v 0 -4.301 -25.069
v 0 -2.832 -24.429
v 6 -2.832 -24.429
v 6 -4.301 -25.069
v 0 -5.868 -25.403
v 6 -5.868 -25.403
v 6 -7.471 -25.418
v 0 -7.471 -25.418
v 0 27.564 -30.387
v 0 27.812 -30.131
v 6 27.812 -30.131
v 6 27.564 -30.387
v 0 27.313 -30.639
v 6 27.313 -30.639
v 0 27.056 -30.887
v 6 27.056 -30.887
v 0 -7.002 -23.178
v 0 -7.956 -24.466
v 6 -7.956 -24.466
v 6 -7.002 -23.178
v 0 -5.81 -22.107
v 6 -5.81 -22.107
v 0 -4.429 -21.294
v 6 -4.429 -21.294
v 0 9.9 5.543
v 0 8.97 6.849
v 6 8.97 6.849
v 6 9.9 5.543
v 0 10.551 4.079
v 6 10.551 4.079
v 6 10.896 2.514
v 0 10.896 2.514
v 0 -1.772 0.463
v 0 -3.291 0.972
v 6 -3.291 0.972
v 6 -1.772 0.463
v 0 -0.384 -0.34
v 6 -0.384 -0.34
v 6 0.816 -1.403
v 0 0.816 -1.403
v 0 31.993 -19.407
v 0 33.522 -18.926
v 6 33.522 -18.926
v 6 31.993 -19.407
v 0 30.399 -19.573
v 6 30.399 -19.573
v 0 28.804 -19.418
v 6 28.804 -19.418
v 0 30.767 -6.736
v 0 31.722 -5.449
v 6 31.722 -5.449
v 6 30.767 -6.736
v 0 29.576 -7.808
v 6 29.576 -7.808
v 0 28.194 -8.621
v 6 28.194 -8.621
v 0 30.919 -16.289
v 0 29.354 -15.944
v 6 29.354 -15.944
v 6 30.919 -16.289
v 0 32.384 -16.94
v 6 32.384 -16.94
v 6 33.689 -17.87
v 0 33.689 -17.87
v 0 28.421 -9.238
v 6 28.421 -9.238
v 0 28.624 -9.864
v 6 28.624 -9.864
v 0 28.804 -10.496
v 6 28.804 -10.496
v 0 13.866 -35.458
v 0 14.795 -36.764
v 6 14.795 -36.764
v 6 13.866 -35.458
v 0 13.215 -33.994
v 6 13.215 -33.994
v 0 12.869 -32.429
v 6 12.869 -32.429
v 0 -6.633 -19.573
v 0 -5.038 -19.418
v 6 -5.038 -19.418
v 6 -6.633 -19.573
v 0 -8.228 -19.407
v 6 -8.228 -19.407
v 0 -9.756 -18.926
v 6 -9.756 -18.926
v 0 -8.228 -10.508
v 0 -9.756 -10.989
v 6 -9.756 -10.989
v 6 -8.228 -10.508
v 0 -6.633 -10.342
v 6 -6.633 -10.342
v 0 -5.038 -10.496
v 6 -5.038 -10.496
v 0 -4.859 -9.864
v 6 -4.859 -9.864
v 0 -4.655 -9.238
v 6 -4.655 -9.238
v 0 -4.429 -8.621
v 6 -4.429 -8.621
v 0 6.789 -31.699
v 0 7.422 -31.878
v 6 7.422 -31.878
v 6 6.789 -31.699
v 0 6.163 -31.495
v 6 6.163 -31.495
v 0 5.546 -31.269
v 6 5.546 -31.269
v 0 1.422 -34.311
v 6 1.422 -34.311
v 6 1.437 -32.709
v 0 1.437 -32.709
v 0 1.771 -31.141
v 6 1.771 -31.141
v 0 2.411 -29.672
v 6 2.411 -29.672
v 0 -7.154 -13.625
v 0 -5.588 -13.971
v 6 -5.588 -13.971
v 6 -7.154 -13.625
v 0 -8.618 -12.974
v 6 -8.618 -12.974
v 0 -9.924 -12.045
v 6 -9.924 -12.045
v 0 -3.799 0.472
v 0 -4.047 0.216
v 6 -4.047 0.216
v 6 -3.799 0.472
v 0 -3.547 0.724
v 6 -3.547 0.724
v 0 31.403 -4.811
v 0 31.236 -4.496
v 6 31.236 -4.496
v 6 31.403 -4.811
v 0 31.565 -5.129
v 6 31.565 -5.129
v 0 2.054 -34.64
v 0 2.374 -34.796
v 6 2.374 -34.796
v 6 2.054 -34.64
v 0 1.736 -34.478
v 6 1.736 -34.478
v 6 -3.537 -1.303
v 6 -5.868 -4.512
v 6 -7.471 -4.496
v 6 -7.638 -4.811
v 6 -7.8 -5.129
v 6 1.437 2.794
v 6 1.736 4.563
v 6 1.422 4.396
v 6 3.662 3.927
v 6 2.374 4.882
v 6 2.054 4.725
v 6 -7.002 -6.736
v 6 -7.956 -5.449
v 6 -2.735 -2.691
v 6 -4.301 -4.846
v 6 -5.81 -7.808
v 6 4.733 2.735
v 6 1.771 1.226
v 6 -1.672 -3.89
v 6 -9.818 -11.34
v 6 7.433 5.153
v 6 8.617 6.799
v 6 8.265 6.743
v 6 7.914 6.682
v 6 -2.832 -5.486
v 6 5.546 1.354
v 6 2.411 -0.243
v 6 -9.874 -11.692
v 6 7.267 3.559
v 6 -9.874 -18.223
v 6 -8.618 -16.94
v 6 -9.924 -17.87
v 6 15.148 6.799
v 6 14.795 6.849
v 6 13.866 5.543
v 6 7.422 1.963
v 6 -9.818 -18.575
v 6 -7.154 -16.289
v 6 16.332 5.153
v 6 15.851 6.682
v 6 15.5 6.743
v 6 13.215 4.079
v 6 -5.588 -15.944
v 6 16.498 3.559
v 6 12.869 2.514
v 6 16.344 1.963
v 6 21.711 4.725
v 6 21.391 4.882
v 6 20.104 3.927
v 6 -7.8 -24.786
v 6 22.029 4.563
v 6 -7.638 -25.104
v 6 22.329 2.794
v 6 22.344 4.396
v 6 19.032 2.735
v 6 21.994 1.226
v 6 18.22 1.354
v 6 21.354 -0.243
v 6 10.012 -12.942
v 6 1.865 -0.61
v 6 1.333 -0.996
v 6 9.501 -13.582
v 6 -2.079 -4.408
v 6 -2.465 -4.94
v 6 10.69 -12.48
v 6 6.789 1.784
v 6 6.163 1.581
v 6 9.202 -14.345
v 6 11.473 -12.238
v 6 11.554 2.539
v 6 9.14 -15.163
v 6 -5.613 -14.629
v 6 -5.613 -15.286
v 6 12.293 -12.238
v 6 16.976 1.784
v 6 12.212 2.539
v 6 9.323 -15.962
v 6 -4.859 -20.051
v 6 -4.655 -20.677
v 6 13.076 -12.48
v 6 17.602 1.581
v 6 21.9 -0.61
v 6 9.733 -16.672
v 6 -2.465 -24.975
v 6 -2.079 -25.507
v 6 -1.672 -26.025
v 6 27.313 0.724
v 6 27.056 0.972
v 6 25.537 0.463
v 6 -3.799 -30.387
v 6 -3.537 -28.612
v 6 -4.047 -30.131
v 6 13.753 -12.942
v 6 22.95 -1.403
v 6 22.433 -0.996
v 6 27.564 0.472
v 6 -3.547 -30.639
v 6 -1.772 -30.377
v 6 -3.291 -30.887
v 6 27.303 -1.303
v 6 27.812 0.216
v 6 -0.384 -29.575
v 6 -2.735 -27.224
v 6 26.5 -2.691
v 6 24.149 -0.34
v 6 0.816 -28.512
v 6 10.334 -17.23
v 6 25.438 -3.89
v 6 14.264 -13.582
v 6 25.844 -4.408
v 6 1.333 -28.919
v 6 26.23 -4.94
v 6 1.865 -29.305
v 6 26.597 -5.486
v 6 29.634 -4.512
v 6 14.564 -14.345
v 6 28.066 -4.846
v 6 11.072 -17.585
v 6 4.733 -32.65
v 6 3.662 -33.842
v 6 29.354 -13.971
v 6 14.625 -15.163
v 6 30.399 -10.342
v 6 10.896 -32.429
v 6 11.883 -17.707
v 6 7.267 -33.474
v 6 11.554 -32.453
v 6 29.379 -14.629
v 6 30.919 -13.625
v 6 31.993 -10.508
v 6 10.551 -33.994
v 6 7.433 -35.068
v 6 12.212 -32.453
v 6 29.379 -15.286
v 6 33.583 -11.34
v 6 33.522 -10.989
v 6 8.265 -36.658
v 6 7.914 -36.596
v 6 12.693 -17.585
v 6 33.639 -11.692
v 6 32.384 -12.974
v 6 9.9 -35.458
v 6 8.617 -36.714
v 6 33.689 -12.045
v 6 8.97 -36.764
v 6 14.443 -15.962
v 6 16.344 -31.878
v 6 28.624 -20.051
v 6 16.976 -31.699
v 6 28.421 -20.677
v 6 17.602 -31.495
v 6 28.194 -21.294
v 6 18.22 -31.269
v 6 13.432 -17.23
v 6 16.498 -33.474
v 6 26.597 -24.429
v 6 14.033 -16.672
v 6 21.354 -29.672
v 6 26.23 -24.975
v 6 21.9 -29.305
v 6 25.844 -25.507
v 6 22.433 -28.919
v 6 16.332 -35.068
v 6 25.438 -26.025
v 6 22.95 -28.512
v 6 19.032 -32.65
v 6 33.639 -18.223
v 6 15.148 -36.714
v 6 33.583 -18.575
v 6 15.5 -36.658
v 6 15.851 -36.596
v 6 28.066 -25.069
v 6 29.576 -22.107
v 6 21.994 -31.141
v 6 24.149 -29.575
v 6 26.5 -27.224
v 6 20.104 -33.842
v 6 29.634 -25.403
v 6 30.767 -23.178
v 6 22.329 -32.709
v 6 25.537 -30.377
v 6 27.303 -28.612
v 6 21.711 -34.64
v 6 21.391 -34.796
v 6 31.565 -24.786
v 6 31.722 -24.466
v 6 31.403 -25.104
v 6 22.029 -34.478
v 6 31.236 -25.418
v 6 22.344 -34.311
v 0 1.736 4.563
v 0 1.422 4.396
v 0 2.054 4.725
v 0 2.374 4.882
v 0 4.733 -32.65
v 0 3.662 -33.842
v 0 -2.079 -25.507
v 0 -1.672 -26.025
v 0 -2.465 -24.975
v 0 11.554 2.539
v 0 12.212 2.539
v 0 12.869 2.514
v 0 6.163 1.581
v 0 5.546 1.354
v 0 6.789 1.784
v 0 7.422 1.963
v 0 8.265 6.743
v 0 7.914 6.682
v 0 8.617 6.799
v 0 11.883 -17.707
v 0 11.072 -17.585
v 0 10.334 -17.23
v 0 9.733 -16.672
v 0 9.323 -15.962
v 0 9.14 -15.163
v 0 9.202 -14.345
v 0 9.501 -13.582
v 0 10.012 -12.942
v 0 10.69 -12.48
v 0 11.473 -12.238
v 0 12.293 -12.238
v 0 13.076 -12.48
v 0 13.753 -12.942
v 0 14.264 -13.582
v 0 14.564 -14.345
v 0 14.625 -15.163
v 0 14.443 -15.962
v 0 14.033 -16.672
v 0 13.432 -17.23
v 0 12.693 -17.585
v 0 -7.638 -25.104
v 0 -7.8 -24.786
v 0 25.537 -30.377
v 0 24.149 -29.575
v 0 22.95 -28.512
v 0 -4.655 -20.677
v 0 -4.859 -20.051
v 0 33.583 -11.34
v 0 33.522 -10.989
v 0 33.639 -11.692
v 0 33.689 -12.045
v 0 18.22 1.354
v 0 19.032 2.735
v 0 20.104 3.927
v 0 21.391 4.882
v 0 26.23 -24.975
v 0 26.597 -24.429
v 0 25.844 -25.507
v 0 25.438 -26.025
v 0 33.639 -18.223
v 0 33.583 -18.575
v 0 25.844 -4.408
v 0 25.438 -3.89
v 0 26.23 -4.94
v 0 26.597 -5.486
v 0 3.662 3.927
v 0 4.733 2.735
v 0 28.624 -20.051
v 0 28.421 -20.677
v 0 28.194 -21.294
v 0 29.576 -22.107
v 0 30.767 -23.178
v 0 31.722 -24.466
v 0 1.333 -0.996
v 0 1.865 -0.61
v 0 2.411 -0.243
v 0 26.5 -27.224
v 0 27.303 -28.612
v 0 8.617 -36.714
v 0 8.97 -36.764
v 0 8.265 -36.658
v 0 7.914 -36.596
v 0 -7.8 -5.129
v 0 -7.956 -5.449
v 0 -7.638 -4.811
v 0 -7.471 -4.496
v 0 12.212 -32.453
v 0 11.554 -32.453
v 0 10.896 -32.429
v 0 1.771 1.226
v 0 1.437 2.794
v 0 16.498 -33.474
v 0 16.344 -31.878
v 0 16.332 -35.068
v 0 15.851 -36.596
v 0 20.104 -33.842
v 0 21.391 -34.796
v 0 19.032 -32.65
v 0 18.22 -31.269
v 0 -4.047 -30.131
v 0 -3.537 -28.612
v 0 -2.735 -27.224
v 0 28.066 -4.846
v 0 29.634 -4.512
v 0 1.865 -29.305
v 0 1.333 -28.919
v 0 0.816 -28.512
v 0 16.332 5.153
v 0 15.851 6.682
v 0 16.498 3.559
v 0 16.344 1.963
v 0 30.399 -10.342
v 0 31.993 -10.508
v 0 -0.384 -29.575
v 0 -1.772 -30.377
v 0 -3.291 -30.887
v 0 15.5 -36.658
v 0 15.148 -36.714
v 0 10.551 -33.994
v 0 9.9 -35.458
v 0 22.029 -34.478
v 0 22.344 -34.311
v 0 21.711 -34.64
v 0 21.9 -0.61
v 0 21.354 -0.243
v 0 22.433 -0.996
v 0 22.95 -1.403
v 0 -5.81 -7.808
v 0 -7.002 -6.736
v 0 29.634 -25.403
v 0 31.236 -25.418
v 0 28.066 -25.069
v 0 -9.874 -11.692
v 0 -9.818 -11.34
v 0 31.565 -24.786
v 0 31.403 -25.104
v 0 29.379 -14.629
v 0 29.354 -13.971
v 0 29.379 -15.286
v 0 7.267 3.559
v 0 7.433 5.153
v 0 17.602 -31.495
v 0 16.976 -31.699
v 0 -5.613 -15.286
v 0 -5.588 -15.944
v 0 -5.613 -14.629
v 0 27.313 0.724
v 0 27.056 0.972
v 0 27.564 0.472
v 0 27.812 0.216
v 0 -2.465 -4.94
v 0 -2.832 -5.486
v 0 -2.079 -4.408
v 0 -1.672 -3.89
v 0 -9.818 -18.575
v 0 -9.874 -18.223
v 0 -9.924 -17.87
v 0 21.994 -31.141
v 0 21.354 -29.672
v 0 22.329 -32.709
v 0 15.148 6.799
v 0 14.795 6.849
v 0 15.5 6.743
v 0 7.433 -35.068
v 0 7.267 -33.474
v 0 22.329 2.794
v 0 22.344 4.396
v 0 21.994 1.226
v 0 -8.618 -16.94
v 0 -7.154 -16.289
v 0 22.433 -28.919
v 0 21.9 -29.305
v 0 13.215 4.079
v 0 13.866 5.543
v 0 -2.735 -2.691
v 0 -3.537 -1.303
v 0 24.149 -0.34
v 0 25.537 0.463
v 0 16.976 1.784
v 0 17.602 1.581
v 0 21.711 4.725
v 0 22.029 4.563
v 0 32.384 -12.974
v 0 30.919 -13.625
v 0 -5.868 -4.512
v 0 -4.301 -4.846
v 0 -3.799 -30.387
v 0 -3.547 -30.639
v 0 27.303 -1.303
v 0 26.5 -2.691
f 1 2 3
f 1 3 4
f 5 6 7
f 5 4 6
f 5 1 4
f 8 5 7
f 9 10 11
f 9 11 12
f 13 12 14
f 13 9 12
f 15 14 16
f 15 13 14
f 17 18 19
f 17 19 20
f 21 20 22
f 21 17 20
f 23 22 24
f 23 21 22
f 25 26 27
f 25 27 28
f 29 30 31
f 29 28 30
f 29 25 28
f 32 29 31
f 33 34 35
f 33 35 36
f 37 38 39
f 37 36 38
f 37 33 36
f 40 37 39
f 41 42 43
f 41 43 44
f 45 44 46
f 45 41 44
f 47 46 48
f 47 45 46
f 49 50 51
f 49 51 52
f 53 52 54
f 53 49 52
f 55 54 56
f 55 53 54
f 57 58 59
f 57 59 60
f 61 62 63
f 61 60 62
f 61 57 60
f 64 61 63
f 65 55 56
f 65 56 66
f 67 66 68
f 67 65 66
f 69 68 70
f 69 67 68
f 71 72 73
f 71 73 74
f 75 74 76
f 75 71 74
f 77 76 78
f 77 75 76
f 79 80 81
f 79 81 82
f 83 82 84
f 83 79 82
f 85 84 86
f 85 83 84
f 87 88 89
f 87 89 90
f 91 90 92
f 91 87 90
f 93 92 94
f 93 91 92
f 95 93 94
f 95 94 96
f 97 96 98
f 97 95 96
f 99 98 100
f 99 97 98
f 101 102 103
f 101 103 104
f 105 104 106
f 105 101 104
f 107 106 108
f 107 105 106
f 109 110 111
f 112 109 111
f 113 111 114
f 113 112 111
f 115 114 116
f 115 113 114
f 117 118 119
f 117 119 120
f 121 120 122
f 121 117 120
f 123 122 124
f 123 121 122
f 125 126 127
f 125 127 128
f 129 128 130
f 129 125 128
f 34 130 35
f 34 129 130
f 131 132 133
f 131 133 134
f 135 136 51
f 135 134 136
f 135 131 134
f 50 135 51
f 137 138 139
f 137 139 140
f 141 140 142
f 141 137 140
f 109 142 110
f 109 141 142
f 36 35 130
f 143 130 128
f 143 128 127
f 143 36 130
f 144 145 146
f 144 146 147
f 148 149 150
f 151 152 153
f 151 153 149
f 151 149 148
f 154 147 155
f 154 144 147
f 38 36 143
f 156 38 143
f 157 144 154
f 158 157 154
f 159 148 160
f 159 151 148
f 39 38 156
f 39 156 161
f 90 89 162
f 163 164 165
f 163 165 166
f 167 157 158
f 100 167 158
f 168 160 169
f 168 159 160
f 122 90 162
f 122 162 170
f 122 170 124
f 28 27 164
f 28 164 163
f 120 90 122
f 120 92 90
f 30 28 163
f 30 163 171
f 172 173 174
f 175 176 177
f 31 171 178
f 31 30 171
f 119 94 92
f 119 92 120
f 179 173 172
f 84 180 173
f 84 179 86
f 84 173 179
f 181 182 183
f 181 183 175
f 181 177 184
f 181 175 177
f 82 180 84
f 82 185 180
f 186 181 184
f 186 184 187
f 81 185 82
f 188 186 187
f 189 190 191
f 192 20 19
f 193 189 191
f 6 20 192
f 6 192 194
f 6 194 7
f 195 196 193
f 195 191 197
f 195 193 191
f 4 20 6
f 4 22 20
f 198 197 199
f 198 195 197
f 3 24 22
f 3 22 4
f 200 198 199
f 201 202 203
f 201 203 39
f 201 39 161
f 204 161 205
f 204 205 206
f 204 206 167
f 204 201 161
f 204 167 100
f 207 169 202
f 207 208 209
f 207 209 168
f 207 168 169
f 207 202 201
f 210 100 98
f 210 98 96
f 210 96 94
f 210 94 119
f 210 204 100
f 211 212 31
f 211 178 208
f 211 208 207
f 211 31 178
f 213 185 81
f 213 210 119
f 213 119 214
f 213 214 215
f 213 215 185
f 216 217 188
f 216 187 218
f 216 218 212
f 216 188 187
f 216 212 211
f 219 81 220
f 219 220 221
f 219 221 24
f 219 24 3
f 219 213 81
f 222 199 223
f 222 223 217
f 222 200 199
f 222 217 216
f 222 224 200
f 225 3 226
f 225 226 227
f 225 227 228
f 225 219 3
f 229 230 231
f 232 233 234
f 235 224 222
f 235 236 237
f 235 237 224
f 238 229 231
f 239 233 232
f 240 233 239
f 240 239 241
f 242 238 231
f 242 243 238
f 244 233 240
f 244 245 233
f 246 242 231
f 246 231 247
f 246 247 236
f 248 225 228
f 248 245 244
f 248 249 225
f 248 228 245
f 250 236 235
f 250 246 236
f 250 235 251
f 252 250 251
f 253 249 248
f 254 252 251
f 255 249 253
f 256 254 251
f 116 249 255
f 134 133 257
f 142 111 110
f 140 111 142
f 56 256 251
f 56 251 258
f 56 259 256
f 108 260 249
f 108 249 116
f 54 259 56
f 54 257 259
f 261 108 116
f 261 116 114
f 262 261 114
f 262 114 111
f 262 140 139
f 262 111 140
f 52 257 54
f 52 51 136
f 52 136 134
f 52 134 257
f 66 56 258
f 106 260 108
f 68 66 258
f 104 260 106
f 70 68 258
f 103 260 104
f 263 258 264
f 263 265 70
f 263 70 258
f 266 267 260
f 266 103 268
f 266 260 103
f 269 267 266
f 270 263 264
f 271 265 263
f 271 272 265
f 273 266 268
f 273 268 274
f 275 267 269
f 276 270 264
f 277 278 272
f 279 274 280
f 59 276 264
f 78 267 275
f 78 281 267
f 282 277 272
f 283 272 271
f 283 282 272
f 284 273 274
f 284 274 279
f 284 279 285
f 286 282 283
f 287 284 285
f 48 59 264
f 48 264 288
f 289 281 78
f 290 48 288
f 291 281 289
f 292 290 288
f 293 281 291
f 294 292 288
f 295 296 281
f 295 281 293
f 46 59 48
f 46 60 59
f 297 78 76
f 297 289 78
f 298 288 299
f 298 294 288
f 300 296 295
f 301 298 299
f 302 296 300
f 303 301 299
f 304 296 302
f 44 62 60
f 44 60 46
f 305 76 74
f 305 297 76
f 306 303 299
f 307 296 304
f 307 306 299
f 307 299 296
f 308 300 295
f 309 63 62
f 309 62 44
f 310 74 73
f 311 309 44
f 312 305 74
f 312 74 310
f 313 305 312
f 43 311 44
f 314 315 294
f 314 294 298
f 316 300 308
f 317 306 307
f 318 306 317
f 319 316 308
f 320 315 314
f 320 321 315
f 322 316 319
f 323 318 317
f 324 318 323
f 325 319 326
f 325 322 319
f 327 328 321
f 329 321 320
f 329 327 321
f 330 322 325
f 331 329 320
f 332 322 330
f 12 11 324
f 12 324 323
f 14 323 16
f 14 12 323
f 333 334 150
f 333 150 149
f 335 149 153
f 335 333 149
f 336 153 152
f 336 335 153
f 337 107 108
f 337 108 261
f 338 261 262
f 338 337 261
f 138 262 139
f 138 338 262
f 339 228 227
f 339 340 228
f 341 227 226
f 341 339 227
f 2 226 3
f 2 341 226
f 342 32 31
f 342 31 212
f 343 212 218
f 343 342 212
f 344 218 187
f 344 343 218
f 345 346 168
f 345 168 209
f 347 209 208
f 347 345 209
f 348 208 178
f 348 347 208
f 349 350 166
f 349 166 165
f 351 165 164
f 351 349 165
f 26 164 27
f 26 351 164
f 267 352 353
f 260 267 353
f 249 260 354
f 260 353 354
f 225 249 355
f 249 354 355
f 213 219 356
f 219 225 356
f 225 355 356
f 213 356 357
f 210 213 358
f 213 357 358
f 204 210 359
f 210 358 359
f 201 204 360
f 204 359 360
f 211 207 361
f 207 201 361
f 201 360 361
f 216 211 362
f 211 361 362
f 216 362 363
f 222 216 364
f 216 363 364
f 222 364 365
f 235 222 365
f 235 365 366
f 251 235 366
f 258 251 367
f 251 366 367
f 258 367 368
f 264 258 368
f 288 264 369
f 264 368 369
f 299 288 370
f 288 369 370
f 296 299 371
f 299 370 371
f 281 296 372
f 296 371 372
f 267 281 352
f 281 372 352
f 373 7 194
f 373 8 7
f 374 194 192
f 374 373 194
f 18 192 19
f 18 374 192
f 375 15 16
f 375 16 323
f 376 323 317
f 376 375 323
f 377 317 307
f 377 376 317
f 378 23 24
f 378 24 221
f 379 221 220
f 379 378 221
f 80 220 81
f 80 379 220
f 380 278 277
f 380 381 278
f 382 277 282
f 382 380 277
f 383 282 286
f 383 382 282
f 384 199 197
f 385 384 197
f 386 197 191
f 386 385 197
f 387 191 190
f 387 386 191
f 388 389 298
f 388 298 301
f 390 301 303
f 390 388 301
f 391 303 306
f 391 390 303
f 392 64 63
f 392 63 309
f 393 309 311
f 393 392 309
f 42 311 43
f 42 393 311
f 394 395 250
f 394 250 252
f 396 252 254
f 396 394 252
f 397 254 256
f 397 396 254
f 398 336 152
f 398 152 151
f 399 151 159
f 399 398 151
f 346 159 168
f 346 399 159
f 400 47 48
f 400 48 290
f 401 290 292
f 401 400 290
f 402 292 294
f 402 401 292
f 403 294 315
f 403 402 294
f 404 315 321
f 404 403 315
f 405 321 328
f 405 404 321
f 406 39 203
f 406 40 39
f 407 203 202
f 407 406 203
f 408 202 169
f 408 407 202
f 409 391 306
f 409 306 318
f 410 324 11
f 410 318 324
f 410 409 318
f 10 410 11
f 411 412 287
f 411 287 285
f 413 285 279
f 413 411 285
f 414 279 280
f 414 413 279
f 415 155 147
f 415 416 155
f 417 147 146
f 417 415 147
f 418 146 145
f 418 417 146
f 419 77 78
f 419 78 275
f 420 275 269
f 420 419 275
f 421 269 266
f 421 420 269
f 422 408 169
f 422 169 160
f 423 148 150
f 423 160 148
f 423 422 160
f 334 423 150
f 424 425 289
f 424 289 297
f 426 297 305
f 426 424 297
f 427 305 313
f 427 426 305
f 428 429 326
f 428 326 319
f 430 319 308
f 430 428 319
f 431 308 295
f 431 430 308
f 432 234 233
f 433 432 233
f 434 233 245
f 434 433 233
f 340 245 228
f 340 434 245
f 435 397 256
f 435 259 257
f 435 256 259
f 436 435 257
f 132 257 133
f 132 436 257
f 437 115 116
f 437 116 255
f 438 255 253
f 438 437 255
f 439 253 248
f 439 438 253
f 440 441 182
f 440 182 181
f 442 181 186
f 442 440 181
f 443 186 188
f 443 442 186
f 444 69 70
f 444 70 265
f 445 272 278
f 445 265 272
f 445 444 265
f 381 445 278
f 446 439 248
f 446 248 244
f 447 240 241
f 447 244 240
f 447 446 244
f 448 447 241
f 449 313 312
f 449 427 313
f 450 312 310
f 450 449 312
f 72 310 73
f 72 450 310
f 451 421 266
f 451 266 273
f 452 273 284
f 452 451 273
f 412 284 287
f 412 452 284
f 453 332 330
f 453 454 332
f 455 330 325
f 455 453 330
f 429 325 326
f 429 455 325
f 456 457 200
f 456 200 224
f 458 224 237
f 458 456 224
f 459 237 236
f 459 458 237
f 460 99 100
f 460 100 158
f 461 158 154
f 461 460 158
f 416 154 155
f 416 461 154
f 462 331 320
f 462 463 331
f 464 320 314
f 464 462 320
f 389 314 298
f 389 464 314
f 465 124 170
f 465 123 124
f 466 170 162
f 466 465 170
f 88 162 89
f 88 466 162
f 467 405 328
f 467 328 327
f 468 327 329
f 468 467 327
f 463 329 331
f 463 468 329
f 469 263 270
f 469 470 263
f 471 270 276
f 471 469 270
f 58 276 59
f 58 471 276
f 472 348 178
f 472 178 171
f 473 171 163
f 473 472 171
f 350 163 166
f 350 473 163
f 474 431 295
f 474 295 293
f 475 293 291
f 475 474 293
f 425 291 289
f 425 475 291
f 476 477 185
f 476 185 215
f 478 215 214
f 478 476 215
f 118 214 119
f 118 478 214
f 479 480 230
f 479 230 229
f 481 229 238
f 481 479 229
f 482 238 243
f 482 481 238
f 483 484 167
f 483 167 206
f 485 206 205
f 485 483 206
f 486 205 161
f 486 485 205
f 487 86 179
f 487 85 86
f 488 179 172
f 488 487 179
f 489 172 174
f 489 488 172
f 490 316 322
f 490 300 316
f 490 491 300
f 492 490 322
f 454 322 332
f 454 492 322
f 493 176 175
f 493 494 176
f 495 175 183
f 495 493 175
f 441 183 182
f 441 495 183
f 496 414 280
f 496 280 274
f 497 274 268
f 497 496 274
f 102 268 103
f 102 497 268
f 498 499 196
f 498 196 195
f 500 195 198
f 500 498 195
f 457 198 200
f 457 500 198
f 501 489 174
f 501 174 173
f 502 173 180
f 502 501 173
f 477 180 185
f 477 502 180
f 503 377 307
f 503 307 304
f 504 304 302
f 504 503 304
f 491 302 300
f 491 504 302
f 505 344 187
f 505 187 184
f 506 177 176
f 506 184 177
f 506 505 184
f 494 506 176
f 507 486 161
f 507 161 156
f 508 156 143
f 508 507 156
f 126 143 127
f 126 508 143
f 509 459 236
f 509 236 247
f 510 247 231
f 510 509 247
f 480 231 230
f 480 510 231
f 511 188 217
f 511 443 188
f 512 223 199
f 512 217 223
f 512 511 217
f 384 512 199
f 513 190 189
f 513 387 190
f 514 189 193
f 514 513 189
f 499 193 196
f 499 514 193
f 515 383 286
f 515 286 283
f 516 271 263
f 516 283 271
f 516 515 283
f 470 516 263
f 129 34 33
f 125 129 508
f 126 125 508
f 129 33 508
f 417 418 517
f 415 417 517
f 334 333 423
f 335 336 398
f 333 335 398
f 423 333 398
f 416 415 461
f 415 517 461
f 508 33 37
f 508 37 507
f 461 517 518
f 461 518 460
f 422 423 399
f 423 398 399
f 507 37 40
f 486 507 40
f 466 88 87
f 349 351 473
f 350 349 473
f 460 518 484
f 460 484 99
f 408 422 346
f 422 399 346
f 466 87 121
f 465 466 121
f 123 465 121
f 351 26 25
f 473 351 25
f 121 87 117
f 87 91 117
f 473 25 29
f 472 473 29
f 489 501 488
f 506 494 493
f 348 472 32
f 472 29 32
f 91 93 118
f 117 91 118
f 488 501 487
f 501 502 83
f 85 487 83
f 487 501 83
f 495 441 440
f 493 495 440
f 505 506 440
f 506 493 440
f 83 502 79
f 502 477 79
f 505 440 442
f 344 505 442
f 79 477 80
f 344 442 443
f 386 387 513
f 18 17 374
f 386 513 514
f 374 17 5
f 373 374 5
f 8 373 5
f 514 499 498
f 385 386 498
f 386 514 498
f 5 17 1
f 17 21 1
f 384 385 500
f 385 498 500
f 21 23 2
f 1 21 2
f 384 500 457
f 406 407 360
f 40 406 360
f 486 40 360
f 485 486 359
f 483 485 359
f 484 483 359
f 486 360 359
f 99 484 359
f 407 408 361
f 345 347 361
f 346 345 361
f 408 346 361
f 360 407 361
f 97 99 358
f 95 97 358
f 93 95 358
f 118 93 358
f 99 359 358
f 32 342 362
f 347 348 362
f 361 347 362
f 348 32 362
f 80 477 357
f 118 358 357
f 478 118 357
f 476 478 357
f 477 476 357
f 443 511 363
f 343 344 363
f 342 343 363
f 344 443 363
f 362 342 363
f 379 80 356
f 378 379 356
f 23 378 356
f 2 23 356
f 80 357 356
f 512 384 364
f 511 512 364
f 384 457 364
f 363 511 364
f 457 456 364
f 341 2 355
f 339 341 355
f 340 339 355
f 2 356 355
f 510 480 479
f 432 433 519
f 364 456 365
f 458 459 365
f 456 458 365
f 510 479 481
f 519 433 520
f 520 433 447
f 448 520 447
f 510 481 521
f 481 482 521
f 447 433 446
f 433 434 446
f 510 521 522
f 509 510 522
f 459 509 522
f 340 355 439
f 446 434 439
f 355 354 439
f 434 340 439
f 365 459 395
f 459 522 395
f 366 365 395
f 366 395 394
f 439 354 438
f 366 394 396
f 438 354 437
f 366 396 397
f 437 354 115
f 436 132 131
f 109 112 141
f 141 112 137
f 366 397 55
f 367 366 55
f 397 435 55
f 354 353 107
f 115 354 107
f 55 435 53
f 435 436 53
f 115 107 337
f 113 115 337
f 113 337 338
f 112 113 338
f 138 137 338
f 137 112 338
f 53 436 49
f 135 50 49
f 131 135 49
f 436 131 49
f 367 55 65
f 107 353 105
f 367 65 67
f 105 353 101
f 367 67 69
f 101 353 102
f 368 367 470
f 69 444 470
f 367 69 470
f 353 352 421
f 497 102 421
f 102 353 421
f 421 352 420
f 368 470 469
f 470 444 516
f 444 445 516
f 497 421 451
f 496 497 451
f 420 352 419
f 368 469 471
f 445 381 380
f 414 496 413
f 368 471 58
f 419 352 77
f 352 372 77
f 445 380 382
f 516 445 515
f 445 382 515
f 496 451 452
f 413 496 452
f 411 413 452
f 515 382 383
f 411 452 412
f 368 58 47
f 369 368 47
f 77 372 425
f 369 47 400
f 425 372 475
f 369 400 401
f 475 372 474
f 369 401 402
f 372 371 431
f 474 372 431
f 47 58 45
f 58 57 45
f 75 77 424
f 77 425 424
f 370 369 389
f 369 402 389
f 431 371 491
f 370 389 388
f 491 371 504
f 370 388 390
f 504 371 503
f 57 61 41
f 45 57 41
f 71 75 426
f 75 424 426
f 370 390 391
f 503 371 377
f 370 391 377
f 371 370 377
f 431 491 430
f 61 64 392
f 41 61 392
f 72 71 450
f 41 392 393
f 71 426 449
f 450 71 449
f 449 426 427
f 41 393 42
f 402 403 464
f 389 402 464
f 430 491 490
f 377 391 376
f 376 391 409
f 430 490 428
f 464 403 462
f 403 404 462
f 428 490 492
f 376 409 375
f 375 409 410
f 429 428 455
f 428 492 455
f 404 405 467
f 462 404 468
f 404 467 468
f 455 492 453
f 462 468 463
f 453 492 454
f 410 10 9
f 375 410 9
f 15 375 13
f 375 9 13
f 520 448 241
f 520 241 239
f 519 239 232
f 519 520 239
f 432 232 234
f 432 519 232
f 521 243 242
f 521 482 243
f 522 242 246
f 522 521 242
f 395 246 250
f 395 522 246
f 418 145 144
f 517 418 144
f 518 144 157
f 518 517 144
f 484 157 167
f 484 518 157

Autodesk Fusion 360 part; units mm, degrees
sketch "Sketch1" plane through (0, 0, 0) normal (1, 0, 0) x (0, 0, -1)
  arc A0 (30.8871, 27.0565) -> (30.1313, 27.8123) centre (14.9574, 11.8827) ccw
  arc A1 (10.989, -9.7564) -> (12.0447, -9.9237) centre (14.9574, 11.8827) ccw
  arc A2 (4.4964, -7.4711) -> (5.4488, -7.9563) centre (14.9574, 11.8827) ccw
  arc A3 (12.0447, 33.689) -> (10.989, 33.5218) centre (14.9574, 11.8827) ccw
  arc A4 (24.4289, 26.5968) -> (25.4184, 31.2364) centre (17.4515, 30.5103) ccw
  arc A5 (34.3112, 22.3437) -> (29.6716, 21.3542) centre (33.5851, 14.3767) ccw
  arc A6 (25.4184, -7.4711) -> (24.4289, -2.8315) centre (17.4515, -6.745) ccw
  arc A7 (32.4286, 10.8965) -> (32.4286, 12.8689) centre (14.9574, 11.8827) ccw
  arc A8 (36.5965, 7.9143) -> (36.7638, 8.97) centre (14.9574, 11.8827) ccw
  arc A9 (30.8871, -3.2912) -> (28.5123, 0.8155) centre (23.0856, -5.0625) ccw
  arc A10 (1.4026, 0.8155) -> (-0.9722, -3.2912) centre (6.8292, -5.0625) ccw
  arc A11 (-1.3539, 18.2195) -> (-1.9634, 16.3437) centre (14.9574, 11.8827) ccw
  arc A12 (-2.5138, 12.8689) -> (-2.5138, 10.8965) centre (14.9574, 11.8827) ccw
  arc A13 (-1.9634, 16.3437) -> (-6.6817, 15.8511) centre (-3.5292, 8.4984) ccw
  arc A14 (28.5123, 0.8155) -> (29.6716, 2.4112) centre (14.9574, 11.8827) ccw
  arc A15 (10.989, -9.7564) -> (12.0447, -9.9237) centre (14.9574, 11.8827) ccw
  arc A16 (29.6716, 2.4112) -> (34.3112, 1.4217) centre (33.5851, 9.3886) ccw
  arc A17 (8.6206, -4.4287) -> (10.4964, -5.0382) centre (14.9574, 11.8827) ccw
  arc A18 (36.7638, 8.97) -> (32.4286, 10.8965) centre (31.4935, 2.9514) ccw
  arc A19 (28.5123, 0.8155) -> (29.6716, 2.4112) centre (14.9574, 11.8827) ccw
  arc A20 (5.4859, -2.8315) -> (4.4964, -7.4711) centre (12.4634, -6.745) ccw
  arc A21 (24.4661, 31.7217) -> (21.2942, 28.194) centre (28.5615, 24.8494) ccw
  arc A22 (-0.9722, 27.0565) -> (1.4026, 22.9498) centre (6.8292, 28.8279) ccw
  arc A23 (21.2942, -4.4287) -> (24.4661, -7.9563) centre (28.5615, -1.0841) ccw
  arc A24 (25.4184, 31.2364) -> (24.4661, 31.7217) centre (14.9574, 11.8827) ccw
  arc A25 (-1.3539, 5.5459) -> (-4.8816, 2.374) centre (1.9907, -1.7214) ccw
  arc A26 (25.4184, -7.4711) -> (24.4289, -2.8315) centre (17.4515, -6.745) ccw
  arc A27 (5.4859, 26.5968) -> (3.8903, 25.4375) centre (14.9574, 11.8827) ccw
  arc A28 (-0.9722, -3.2912) -> (-0.2164, -4.047) centre (14.9574, 11.8827) ccw
  arc A29 (-6.8489, 8.97) -> (-6.6817, 7.9143) centre (14.9574, 11.8827) ccw
  arc A30 (24.4661, -7.9563) -> (25.4184, -7.4711) centre (14.9574, 11.8827) ccw
  arc A31 (10.989, 33.5218) -> (10.4964, 28.8035) centre (18.3417, 30.3693) ccw
  arc A32 (-0.2164, -4.047) -> (3.8903, -1.6722) centre (-1.9878, 3.7545) ccw
  arc A33 (18.9258, 33.5218) -> (17.8701, 33.689) centre (14.9574, 11.8827) ccw
  arc A34 (3.8903, 25.4375) -> (-0.2164, 27.8123) centre (-1.9878, 20.0109) ccw
  arc A35 (12.0447, 33.689) -> (10.989, 33.5218) centre (14.9574, 11.8827) ccw
  arc A36 (0.2433, 2.4112) -> (1.4026, 0.8155) centre (14.9574, 11.8827) ccw
  arc A37 (-0.9722, 27.0565) -> (1.4026, 22.9498) centre (6.8292, 28.8279) ccw
  arc A38 (24.4289, -2.8315) -> (26.0246, -1.6722) centre (14.9574, 11.8827) ccw
  arc A39 (-6.8489, 8.97) -> (-6.6817, 7.9143) centre (14.9574, 11.8827) ccw
  arc A40 (-4.3963, 1.4217) -> (0.2433, 2.4112) centre (-3.6702, 9.3886) ccw
  arc A41 (1.4026, 0.8155) -> (-0.9722, -3.2912) centre (6.8292, -5.0625) ccw
  arc A42 (-0.2164, 27.8123) -> (-0.9722, 27.0565) centre (14.9574, 11.8827) ccw
  arc A43 (8.6206, 28.194) -> (5.4488, 31.7217) centre (1.3533, 24.8494) ccw
  arc A44 (4.4964, 31.2364) -> (5.4859, 26.5968) centre (12.4634, 30.5103) ccw
  arc A45 (0.2433, 21.3542) -> (-4.3963, 22.3437) centre (-3.6702, 14.3767) ccw
  arc A46 (18.9258, 33.5218) -> (17.8701, 33.689) centre (14.9574, 11.8827) ccw
  arc A47 (4.4964, 31.2364) -> (5.4859, 26.5968) centre (12.4634, 30.5103) ccw
  arc A48 (19.4184, 28.8035) -> (18.9258, 33.5218) centre (11.5731, 30.3693) ccw
  arc A49 (-1.9634, 7.4217) -> (-1.3539, 5.5459) centre (14.9574, 11.8827) ccw
  arc A50 (10.4964, -5.0382) -> (10.989, -9.7564) centre (18.3417, -6.604) ccw
  arc A51 (30.8871, 27.0565) -> (30.1313, 27.8123) centre (14.9574, 11.8827) ccw
  arc A52 (-4.8816, 2.374) -> (-4.3963, 1.4217) centre (14.9574, 11.8827) ccw
  arc A53 (21.2942, 28.194) -> (19.4184, 28.8035) centre (14.9574, 11.8827) ccw
  arc A54 (-0.9722, -3.2912) -> (-0.2164, -4.047) centre (14.9574, 11.8827) ccw
  arc A55 (30.1313, 27.8123) -> (26.0246, 25.4375) centre (31.9027, 20.0109) ccw
  arc A56 (-4.3963, 22.3437) -> (-4.8816, 21.3913) centre (14.9574, 11.8827) ccw
  arc A57 (13.9712, 29.3539) -> (12.0447, 33.689) centre (6.0261, 28.4187) ccw
  arc A58 (-2.5138, 10.8965) -> (-6.8489, 8.97) centre (-1.5786, 2.9514) ccw
  arc A59 (13.9712, 29.3539) -> (12.0447, 33.689) centre (6.0261, 28.4187) ccw
  arc A60 (34.7964, 21.3913) -> (34.3112, 22.3437) centre (14.9574, 11.8827) ccw
  arc A61 (8.6206, 28.194) -> (5.4488, 31.7217) centre (1.3533, 24.8494) ccw
  arc A62 (-2.5138, 12.8689) -> (-2.5138, 10.8965) centre (14.9574, 11.8827) ccw
  arc A63 (19.4184, -5.0382) -> (21.2942, -4.4287) centre (14.9574, 11.8827) ccw
  arc A64 (13.9712, -5.5885) -> (15.9436, -5.5885) centre (14.9574, 11.8827) ccw
  arc A65 (30.1313, 27.8123) -> (26.0246, 25.4375) centre (31.9027, 20.0109) ccw
  arc A66 (19.4184, 28.8035) -> (18.9258, 33.5218) centre (11.5731, 30.3693) ccw
  arc A67 (18.9258, -9.7564) -> (19.4184, -5.0382) centre (11.5731, -6.604) ccw
  arc A68 (-6.6817, 7.9143) -> (-1.9634, 7.4217) centre (-3.5292, 15.267) ccw
  arc A69 (5.4488, 31.7217) -> (4.4964, 31.2364) centre (14.9574, 11.8827) ccw
  arc A70 (12.0447, -9.9237) -> (13.9712, -5.5885) centre (6.0261, -4.6534) ccw
  arc A71 (36.7638, 14.7954) -> (36.5965, 15.8511) centre (14.9574, 11.8827) ccw
  arc A72 (32.4286, 12.8689) -> (36.7638, 14.7954) centre (31.4935, 20.814) ccw
  arc A73 (10.4964, 28.8035) -> (8.6206, 28.194) centre (14.9574, 11.8827) ccw
  arc A74 (15.9436, -5.5885) -> (17.8701, -9.9237) centre (23.8887, -4.6534) ccw
  arc A75 (17.8701, -9.9237) -> (18.9258, -9.7564) centre (14.9574, 11.8827) ccw
  arc A76 (1.4026, 22.9498) -> (0.2433, 21.3542) centre (14.9574, 11.8827) ccw
  arc A77 (26.0246, 25.4375) -> (24.4289, 26.5968) centre (14.9574, 11.8827) ccw
  arc A78 (17.8701, 33.689) -> (15.9436, 29.3539) centre (23.8887, 28.4187) ccw
  arc A79 (32.4286, 10.8965) -> (32.4286, 12.8689) centre (14.9574, 11.8827) ccw
  arc A80 (15.9436, 29.3539) -> (13.9712, 29.3539) centre (14.9574, 11.8827) ccw
  arc A81 (24.4289, 26.5968) -> (25.4184, 31.2364) centre (17.4515, 30.5103) ccw
  arc A82 (32.4286, 12.8689) -> (36.7638, 14.7954) centre (31.4935, 20.814) ccw
  arc A83 (25.4184, 31.2364) -> (24.4661, 31.7217) centre (14.9574, 11.8827) ccw
  arc A84 (36.7638, 14.7954) -> (36.5965, 15.8511) centre (14.9574, 11.8827) ccw
  arc A85 (34.7964, 21.3913) -> (34.3112, 22.3437) centre (14.9574, 11.8827) ccw
  arc A86 (31.2688, 18.2195) -> (34.7964, 21.3913) centre (27.9242, 25.4868) ccw
  arc A87 (28.5123, 22.9498) -> (30.8871, 27.0565) centre (23.0856, 28.8279) ccw
  arc A88 (34.3112, 22.3437) -> (29.6716, 21.3542) centre (33.5851, 14.3767) ccw
  arc A89 (31.8783, 16.3437) -> (31.2688, 18.2195) centre (14.9574, 11.8827) ccw
  arc A90 (36.5965, 15.8511) -> (31.8783, 16.3437) centre (33.4441, 8.4984) ccw
  arc A91 (29.6716, 21.3542) -> (28.5123, 22.9498) centre (14.9574, 11.8827) ccw
  arc A92 (-4.8816, 21.3913) -> (-1.3539, 18.2195) centre (1.9907, 25.4868) ccw
  arc A93 (4.4964, -7.4711) -> (5.4488, -7.9563) centre (14.9574, 11.8827) ccw
  arc A94 (30.1313, -4.047) -> (30.8871, -3.2912) centre (14.9574, 11.8827) ccw
  arc A95 (5.4859, -2.8315) -> (4.4964, -7.4711) centre (12.4634, -6.745) ccw
  arc A96 (5.4488, -7.9563) -> (8.6206, -4.4287) centre (1.3533, -1.0841) ccw
  arc A97 (26.0246, -1.6722) -> (30.1313, -4.047) centre (31.9027, 3.7545) ccw
  arc A98 (-1.3539, 18.2195) -> (-1.9634, 16.3437) centre (14.9574, 11.8827) ccw
  arc A99 (10.989, 33.5218) -> (10.4964, 28.8035) centre (18.3417, 30.3693) ccw
  arc A100 (30.1313, -4.047) -> (30.8871, -3.2912) centre (14.9574, 11.8827) ccw
  arc A101 (-4.3963, 22.3437) -> (-4.8816, 21.3913) centre (14.9574, 11.8827) ccw
  arc A102 (21.2942, -4.4287) -> (24.4661, -7.9563) centre (28.5615, -1.0841) ccw
  arc A103 (15.9436, -5.5885) -> (17.8701, -9.9237) centre (23.8887, -4.6534) ccw
  arc A104 (29.6716, 2.4112) -> (34.3112, 1.4217) centre (33.5851, 9.3886) ccw
  arc A105 (18.9258, -9.7564) -> (19.4184, -5.0382) centre (11.5731, -6.604) ccw
  arc A106 (3.8903, -1.6722) -> (5.4859, -2.8315) centre (14.9574, 11.8827) ccw
  arc A107 (31.8783, 7.4217) -> (36.5965, 7.9143) centre (33.4441, 15.267) ccw
  arc A108 (34.3112, 1.4217) -> (34.7964, 2.374) centre (14.9574, 11.8827) ccw
  arc A109 (1.4026, 22.9498) -> (0.2433, 21.3542) centre (14.9574, 11.8827) ccw
  arc A110 (0.2433, 21.3542) -> (-4.3963, 22.3437) centre (-3.6702, 14.3767) ccw
  arc A111 (34.7964, 2.374) -> (31.2688, 5.5459) centre (27.9242, -1.7214) ccw
  arc A112 (24.4661, -7.9563) -> (25.4184, -7.4711) centre (14.9574, 11.8827) ccw
  arc A113 (26.0246, -1.6722) -> (30.1313, -4.047) centre (31.9027, 3.7545) ccw
  arc A114 (31.2688, 5.5459) -> (31.8783, 7.4217) centre (14.9574, 11.8827) ccw
  arc A115 (10.4964, -5.0382) -> (10.989, -9.7564) centre (18.3417, -6.604) ccw
  arc A116 (12.0447, -9.9237) -> (13.9712, -5.5885) centre (6.0261, -4.6534) ccw
  arc A117 (-6.6817, 15.8511) -> (-6.8489, 14.7954) centre (14.9574, 11.8827) ccw
  arc A118 (34.3112, 1.4217) -> (34.7964, 2.374) centre (14.9574, 11.8827) ccw
  arc A119 (24.4289, -2.8315) -> (26.0246, -1.6722) centre (14.9574, 11.8827) ccw
  arc A120 (-6.8489, 14.7954) -> (-2.5138, 12.8689) centre (-1.5786, 20.814) ccw
  arc A121 (-4.8816, 2.374) -> (-4.3963, 1.4217) centre (14.9574, 11.8827) ccw
  arc A122 (10.4964, 28.8035) -> (8.6206, 28.194) centre (14.9574, 11.8827) ccw
  arc A123 (5.4859, 26.5968) -> (3.8903, 25.4375) centre (14.9574, 11.8827) ccw
  arc A124 (36.5965, 7.9143) -> (36.7638, 8.97) centre (14.9574, 11.8827) ccw
  arc A125 (3.8903, -1.6722) -> (5.4859, -2.8315) centre (14.9574, 11.8827) ccw
  arc A126 (-2.5138, 10.8965) -> (-6.8489, 8.97) centre (-1.5786, 2.9514) ccw
  arc A127 (5.4488, 31.7217) -> (4.4964, 31.2364) centre (14.9574, 11.8827) ccw
  arc A128 (-4.3963, 1.4217) -> (0.2433, 2.4112) centre (-3.6702, 9.3886) ccw
  arc A129 (34.7964, 2.374) -> (31.2688, 5.5459) centre (27.9242, -1.7214) ccw
  arc A130 (13.9712, -5.5885) -> (15.9436, -5.5885) centre (14.9574, 11.8827) ccw
  arc A131 (-6.6817, 7.9143) -> (-1.9634, 7.4217) centre (-3.5292, 15.267) ccw
  arc A132 (31.8783, 7.4217) -> (36.5965, 7.9143) centre (33.4441, 15.267) ccw
  arc A133 (5.4488, -7.9563) -> (8.6206, -4.4287) centre (1.3533, -1.0841) ccw
  arc A134 (0.2433, 2.4112) -> (1.4026, 0.8155) centre (14.9574, 11.8827) ccw
  arc A135 (36.7638, 8.97) -> (32.4286, 10.8965) centre (31.4935, 2.9514) ccw
  arc A136 (-0.2164, -4.047) -> (3.8903, -1.6722) centre (-1.9878, 3.7545) ccw
  arc A137 (28.5123, 22.9498) -> (30.8871, 27.0565) centre (23.0856, 28.8279) ccw
  arc A138 (19.4184, -5.0382) -> (21.2942, -4.4287) centre (14.9574, 11.8827) ccw
  arc A139 (17.8701, -9.9237) -> (18.9258, -9.7564) centre (14.9574, 11.8827) ccw
  arc A140 (30.8871, -3.2912) -> (28.5123, 0.8155) centre (23.0856, -5.0625) ccw
  arc A141 (21.2942, 28.194) -> (19.4184, 28.8035) centre (14.9574, 11.8827) ccw
  arc A142 (36.5965, 15.8511) -> (31.8783, 16.3437) centre (33.4441, 8.4984) ccw
  arc A143 (-1.9634, 16.3437) -> (-6.6817, 15.8511) centre (-3.5292, 8.4984) ccw
  arc A144 (-6.8489, 14.7954) -> (-2.5138, 12.8689) centre (-1.5786, 20.814) ccw
  arc A145 (29.6716, 21.3542) -> (28.5123, 22.9498) centre (14.9574, 11.8827) ccw
  arc A146 (8.6206, -4.4287) -> (10.4964, -5.0382) centre (14.9574, 11.8827) ccw
  arc A147 (-4.8816, 21.3913) -> (-1.3539, 18.2195) centre (1.9907, 25.4868) ccw
  arc A148 (26.0246, 25.4375) -> (24.4289, 26.5968) centre (14.9574, 11.8827) ccw
  arc A149 (3.8903, 25.4375) -> (-0.2164, 27.8123) centre (-1.9878, 20.0109) ccw
  arc A150 (17.8701, 33.689) -> (15.9436, 29.3539) centre (23.8887, 28.4187) ccw
  arc A151 (-1.9634, 7.4217) -> (-1.3539, 5.5459) centre (14.9574, 11.8827) ccw
  arc A152 (15.9436, 29.3539) -> (13.9712, 29.3539) centre (14.9574, 11.8827) ccw
  arc A153 (31.8783, 16.3437) -> (31.2688, 18.2195) centre (14.9574, 11.8827) ccw
  arc A154 (-6.6817, 15.8511) -> (-6.8489, 14.7954) centre (14.9574, 11.8827) ccw
  arc A155 (-1.3539, 5.5459) -> (-4.8816, 2.374) centre (1.9907, -1.7214) ccw
  arc A156 (24.4661, 31.7217) -> (21.2942, 28.194) centre (28.5615, 24.8494) ccw
  arc A157 (-0.2164, 27.8123) -> (-0.9722, 27.0565) centre (14.9574, 11.8827) ccw
  arc A158 (31.2688, 18.2195) -> (34.7964, 21.3913) centre (27.9242, 25.4868) ccw
  arc A159 (31.2688, 5.5459) -> (31.8783, 7.4217) centre (14.9574, 11.8827) ccw
  circle A160 centre (14.9574, 11.8827) radius 2.75
  dimension "d4" = 5.5
extrude "Extrude1" add sketch "Sketch1" along normal blind 6
